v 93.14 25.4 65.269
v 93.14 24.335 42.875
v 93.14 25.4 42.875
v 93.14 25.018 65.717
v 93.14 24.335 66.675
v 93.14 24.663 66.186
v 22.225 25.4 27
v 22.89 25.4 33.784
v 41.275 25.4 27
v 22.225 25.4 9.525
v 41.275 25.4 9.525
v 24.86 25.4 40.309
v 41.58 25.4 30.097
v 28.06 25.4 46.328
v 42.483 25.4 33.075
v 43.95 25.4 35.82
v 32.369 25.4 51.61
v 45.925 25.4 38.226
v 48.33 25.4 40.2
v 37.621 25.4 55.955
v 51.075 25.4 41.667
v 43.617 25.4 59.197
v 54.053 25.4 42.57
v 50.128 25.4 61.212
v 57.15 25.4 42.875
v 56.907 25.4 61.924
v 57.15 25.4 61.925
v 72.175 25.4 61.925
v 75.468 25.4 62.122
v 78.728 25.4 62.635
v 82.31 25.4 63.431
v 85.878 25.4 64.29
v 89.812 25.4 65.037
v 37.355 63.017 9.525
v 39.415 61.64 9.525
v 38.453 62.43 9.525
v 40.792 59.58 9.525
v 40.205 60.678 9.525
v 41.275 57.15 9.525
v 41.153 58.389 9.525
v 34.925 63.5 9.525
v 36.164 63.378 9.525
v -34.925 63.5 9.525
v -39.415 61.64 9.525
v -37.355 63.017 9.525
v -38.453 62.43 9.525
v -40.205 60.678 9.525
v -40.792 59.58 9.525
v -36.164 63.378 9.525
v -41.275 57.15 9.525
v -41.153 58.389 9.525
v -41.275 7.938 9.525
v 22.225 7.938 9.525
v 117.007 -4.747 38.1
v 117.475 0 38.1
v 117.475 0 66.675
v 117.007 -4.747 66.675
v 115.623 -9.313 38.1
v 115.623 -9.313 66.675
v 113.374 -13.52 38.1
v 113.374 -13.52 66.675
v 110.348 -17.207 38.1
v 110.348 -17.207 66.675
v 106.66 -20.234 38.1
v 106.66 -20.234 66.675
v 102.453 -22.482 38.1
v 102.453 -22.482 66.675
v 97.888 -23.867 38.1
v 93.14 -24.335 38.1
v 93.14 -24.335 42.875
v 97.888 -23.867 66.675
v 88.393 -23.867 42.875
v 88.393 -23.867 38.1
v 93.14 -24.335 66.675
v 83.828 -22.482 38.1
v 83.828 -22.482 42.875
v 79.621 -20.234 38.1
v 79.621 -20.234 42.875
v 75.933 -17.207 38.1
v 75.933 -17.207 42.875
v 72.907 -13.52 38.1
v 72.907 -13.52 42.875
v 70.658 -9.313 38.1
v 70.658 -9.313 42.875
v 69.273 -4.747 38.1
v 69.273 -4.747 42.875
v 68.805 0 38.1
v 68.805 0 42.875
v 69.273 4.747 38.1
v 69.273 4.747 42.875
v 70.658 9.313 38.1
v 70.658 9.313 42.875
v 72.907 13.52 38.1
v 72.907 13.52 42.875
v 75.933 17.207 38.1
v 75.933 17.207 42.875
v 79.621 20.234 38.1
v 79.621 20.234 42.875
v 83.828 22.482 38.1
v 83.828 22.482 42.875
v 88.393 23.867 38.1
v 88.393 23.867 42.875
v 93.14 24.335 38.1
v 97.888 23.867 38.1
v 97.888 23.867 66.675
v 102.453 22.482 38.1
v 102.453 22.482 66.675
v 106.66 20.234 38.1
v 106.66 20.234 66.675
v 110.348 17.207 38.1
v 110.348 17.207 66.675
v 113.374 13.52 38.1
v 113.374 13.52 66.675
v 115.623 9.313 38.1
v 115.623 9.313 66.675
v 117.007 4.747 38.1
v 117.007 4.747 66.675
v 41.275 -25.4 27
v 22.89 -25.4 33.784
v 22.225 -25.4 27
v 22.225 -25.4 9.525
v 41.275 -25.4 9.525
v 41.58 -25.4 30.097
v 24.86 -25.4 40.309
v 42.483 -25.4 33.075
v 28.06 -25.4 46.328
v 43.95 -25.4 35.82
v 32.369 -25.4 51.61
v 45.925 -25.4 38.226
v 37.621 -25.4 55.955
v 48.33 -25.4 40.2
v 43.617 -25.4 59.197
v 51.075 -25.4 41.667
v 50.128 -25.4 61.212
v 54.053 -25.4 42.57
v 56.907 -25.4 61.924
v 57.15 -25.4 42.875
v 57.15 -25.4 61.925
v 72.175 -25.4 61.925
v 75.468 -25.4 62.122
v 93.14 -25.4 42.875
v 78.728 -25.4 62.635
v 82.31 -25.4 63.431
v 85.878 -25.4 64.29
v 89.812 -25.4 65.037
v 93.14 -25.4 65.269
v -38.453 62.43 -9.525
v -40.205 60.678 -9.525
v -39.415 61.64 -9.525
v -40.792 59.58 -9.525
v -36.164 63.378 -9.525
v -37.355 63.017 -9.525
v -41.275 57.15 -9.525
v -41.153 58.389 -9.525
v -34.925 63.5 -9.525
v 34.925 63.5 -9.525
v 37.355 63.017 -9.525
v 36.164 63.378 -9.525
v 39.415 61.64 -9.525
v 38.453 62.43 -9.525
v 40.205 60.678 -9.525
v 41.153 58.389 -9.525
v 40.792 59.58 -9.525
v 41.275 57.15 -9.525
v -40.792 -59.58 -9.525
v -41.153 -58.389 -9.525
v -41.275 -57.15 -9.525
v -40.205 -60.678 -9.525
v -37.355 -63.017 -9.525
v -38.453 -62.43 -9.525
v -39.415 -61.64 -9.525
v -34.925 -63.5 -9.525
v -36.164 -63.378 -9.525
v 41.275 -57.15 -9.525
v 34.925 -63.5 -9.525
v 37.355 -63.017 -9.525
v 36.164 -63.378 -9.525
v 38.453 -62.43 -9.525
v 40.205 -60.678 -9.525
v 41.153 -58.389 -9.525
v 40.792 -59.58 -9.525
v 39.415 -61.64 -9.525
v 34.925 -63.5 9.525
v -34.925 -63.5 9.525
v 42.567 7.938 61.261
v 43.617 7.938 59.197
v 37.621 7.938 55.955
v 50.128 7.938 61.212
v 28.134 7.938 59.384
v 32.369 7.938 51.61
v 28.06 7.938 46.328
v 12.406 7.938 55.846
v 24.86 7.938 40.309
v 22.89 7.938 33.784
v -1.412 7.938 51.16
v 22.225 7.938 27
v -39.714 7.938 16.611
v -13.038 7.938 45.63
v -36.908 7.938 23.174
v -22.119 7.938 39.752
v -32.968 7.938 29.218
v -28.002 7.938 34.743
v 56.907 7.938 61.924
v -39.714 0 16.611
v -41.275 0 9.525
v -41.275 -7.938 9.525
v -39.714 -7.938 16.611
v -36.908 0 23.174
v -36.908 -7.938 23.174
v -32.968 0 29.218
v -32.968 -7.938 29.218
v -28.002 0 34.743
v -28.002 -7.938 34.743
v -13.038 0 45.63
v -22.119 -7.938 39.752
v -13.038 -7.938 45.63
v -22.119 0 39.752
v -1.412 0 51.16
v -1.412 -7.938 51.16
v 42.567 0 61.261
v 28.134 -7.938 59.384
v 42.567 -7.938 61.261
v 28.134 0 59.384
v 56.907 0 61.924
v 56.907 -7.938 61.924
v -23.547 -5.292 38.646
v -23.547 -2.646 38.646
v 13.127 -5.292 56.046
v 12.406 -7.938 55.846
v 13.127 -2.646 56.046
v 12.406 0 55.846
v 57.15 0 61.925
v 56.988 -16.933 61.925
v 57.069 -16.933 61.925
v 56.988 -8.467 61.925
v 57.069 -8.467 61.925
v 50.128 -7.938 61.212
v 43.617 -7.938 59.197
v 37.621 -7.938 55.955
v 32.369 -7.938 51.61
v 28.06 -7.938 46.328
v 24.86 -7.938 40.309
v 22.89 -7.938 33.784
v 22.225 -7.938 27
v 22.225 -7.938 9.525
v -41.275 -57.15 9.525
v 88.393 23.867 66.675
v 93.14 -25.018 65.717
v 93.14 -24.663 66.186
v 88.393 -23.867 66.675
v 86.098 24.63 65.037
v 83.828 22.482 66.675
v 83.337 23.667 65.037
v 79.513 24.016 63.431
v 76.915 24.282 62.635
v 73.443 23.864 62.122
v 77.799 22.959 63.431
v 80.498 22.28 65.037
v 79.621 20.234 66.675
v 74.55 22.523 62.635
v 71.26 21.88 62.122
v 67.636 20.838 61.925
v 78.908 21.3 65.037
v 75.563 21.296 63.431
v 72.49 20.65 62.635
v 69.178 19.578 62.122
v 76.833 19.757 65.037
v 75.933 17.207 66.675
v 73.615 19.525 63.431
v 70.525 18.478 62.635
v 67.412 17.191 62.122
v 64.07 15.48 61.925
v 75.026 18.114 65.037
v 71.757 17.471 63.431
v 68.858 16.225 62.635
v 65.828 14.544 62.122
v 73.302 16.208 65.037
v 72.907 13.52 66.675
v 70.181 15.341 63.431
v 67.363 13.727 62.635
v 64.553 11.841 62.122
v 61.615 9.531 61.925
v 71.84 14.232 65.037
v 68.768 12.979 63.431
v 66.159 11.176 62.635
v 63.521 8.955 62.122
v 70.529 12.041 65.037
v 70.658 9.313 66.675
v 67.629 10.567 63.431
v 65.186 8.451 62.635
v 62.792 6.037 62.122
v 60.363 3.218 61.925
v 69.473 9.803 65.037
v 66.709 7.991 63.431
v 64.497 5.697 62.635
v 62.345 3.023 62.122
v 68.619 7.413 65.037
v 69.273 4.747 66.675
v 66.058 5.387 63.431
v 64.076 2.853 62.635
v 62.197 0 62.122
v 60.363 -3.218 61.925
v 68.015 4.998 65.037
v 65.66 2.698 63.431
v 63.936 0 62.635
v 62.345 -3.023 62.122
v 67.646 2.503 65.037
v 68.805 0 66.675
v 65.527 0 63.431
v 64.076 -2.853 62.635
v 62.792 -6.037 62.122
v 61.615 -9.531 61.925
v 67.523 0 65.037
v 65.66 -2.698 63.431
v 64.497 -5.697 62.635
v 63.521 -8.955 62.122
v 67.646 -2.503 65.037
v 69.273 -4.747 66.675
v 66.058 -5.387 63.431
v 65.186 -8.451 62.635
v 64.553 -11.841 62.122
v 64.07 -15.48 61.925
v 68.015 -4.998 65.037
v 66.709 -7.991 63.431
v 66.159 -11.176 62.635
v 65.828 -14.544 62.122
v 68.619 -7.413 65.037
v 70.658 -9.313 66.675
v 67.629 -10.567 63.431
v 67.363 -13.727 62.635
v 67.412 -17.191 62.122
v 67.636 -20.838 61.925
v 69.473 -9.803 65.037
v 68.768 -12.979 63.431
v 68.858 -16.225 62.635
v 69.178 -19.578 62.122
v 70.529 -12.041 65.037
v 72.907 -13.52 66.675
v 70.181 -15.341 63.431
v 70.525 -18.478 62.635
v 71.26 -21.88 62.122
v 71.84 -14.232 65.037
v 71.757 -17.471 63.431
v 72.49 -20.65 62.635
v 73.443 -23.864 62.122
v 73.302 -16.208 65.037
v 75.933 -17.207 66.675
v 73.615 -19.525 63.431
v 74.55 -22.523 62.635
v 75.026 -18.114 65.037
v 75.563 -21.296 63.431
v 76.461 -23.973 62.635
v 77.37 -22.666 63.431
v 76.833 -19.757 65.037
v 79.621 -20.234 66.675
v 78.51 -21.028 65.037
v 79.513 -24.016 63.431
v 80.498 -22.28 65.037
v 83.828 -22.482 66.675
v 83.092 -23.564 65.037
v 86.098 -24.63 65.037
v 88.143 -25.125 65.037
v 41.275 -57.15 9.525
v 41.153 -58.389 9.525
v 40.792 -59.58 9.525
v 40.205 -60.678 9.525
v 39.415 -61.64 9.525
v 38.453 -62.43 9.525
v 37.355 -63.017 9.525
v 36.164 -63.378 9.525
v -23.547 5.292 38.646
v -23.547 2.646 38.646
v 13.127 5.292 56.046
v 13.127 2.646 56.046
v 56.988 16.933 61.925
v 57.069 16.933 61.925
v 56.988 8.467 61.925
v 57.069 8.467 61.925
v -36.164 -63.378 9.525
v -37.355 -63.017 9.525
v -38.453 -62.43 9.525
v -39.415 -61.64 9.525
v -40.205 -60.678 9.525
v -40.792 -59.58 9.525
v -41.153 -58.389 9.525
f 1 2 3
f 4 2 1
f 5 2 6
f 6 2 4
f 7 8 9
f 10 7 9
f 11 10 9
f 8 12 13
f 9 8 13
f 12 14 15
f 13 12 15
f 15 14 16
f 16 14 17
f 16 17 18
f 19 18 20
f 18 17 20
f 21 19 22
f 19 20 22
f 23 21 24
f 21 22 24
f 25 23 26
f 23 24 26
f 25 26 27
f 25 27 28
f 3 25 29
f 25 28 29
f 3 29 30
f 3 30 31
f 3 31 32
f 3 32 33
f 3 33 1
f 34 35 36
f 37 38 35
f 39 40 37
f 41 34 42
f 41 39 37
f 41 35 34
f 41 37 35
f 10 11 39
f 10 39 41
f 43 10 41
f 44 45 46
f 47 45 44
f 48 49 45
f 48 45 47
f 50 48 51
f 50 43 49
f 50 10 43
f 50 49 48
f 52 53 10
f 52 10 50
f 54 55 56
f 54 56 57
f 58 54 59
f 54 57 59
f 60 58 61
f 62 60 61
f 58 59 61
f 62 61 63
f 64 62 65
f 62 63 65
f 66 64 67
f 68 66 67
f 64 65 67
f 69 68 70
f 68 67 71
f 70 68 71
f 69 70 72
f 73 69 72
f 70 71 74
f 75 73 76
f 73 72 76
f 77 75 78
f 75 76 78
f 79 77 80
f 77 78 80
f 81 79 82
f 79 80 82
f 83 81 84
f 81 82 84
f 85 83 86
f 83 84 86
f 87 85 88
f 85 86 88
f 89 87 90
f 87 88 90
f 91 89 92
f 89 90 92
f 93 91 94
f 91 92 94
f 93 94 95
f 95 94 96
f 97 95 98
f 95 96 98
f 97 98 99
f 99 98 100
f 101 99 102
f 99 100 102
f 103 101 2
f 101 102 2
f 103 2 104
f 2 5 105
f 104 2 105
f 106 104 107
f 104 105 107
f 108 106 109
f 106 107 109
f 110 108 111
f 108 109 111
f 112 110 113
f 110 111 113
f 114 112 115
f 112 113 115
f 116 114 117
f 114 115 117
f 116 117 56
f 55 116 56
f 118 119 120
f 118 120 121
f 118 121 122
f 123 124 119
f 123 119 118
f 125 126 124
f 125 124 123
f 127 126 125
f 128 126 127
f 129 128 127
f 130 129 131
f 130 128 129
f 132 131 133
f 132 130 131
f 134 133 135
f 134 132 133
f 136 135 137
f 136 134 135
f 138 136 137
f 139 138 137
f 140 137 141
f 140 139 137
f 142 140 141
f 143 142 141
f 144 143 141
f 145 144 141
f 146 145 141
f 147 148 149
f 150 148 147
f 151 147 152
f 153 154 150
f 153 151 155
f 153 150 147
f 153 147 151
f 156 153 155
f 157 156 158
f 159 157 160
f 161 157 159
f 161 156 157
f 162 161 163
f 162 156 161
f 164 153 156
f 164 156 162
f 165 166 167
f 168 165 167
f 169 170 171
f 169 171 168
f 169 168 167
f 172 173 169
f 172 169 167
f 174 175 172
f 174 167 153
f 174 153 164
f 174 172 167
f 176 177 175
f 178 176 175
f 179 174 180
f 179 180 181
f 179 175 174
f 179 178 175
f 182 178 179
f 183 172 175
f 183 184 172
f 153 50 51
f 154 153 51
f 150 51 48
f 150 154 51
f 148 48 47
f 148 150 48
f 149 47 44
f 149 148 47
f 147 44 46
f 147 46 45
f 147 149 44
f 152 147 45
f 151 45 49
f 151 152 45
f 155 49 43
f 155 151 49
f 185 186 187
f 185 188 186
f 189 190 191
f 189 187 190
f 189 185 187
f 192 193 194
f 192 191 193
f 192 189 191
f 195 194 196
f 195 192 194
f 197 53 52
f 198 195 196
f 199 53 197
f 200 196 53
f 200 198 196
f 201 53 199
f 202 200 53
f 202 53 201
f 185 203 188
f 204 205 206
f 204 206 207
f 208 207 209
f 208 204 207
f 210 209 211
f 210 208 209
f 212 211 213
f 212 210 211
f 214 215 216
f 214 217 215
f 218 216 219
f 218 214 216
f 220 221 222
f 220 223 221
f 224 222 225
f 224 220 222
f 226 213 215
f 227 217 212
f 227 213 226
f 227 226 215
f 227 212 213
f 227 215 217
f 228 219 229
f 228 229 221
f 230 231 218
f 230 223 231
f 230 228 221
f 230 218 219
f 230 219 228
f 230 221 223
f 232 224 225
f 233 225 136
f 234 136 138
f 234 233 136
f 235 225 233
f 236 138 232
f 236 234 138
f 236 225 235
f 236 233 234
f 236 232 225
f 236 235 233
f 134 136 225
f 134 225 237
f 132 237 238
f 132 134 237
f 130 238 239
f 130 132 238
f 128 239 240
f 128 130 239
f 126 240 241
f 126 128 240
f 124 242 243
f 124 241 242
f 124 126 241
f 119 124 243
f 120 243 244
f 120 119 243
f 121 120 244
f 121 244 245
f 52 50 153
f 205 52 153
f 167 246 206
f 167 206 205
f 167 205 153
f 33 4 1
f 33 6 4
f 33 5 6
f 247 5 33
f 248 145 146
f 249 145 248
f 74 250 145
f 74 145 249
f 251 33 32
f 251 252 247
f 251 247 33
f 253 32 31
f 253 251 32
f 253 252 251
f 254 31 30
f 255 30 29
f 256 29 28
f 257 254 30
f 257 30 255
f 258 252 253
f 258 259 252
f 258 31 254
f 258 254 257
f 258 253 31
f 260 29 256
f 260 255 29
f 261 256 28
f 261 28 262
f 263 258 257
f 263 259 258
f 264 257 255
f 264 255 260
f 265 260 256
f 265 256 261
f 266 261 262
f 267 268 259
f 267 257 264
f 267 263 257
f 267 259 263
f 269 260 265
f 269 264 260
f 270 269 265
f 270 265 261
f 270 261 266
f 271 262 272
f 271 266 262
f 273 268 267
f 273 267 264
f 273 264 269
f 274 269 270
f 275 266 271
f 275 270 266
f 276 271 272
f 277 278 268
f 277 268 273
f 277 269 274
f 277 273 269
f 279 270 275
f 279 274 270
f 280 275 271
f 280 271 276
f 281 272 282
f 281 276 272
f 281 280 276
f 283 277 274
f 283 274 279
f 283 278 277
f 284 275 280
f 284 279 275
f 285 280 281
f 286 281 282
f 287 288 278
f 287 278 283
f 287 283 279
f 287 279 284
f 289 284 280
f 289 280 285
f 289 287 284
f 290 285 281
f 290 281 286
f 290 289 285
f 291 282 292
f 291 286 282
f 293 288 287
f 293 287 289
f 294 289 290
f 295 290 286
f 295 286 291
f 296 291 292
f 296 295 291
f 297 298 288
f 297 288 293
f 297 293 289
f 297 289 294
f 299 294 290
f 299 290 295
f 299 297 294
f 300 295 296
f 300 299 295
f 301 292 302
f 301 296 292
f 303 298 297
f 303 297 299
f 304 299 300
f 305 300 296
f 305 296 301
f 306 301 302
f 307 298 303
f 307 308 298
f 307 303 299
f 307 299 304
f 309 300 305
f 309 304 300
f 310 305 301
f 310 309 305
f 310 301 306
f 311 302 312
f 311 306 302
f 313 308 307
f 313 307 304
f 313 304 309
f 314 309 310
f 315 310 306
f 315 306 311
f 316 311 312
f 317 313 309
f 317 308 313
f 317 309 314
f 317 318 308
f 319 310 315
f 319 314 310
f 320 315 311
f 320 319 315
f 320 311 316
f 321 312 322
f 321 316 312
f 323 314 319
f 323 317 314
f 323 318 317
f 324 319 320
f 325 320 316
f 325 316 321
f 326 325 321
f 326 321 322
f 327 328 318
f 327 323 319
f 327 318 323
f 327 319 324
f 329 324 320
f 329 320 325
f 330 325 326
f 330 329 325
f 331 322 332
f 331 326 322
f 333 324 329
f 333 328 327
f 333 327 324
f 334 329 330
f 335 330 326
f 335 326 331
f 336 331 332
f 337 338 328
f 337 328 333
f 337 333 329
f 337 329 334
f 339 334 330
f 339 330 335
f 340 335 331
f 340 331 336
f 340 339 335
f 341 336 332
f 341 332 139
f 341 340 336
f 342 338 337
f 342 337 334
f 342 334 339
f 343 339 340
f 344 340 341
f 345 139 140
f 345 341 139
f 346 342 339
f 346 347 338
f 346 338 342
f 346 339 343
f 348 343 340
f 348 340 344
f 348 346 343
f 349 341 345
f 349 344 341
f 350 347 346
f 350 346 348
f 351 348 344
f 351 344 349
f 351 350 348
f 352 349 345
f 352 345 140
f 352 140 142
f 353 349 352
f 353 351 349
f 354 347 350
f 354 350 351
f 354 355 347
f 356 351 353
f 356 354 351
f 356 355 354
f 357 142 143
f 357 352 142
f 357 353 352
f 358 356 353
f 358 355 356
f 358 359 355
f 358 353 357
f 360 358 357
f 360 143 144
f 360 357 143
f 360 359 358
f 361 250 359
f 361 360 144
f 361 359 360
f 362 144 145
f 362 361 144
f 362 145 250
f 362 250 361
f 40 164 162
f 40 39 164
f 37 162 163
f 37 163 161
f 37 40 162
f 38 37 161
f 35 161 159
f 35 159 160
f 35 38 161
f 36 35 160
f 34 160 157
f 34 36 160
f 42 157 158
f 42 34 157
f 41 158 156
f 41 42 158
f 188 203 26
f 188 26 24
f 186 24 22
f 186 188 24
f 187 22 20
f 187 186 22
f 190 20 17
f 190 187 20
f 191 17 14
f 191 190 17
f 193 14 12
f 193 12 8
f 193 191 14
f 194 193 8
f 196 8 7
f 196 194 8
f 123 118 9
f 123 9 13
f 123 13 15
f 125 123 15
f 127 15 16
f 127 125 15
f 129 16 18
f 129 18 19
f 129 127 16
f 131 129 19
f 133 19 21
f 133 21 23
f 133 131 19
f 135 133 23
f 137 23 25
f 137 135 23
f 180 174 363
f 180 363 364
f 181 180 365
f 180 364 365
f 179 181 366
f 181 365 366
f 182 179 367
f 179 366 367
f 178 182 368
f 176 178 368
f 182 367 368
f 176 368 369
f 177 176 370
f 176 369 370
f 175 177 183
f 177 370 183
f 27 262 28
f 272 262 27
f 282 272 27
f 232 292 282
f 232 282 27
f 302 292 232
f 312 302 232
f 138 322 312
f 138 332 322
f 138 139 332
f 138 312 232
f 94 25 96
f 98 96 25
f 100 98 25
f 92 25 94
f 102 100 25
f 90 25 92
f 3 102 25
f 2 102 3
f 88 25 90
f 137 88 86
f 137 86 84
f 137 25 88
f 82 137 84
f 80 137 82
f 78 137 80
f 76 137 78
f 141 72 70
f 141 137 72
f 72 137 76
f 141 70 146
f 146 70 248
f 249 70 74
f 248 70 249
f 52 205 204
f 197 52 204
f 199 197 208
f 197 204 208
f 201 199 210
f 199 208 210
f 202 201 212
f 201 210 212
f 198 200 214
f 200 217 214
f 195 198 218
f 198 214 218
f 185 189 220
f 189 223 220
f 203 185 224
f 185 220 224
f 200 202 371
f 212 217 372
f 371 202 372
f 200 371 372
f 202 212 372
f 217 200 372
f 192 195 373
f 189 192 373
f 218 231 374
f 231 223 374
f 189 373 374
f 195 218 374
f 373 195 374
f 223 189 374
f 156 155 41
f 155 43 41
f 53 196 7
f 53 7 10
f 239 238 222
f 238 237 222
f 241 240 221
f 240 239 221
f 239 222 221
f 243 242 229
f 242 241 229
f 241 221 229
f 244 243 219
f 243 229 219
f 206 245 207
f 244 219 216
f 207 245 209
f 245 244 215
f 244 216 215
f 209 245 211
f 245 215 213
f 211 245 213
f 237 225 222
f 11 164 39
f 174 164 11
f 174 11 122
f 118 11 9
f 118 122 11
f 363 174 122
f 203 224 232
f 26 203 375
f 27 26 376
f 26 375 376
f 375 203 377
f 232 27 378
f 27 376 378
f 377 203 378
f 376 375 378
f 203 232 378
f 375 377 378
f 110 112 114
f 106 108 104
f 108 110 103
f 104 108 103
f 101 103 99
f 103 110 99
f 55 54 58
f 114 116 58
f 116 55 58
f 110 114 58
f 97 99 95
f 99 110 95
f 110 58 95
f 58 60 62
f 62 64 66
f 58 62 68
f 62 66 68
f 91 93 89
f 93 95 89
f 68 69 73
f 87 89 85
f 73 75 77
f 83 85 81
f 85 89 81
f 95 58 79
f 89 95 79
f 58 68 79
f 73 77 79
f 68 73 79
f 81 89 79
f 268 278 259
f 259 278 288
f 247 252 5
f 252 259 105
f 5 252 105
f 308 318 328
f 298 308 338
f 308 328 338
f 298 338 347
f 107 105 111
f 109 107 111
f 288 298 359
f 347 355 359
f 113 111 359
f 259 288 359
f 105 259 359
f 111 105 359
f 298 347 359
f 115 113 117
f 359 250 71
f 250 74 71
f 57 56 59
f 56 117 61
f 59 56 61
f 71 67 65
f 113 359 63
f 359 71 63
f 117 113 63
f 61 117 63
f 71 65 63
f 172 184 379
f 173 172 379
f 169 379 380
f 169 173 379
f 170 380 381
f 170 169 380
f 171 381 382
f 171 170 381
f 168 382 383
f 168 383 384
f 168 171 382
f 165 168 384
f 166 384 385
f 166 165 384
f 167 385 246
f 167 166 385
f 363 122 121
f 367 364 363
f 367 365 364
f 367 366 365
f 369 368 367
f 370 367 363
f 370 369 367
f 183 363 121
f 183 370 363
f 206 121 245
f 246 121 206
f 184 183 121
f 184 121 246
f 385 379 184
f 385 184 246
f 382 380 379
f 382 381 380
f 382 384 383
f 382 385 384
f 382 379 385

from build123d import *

# Parameters (mm, degrees)
F1_DEPTH    = 63.5
F0_W        = 26.465196414
F0_H        = 19.05
F2_DEPTH    = 25.4
F3_DEPTH    = 7.9375
F5_R        = 6.35
F6_T4_ANGLE = 180


# Not quite as in the source:
# - a fillet or chamfer that OpenCascade refuses, or shapes differently, is made with other operations: its cross-section is extruded or revolved along the edge and cut away or added


with BuildPart() as f1:
    # F0 (on Front) → F1 (new body, symmetric)
    with BuildSketch(Plane.XZ):
        Polygon((-41.275, -9.525), (41.275, -9.525), (41.275, 9.525), (22.225, 9.525), (-41.275, 9.525), align=None)
    extrude(amount=F1_DEPTH, both=True)

    # F0 (on Front) → F2 (join, symmetric)
    with BuildSketch(Plane.XZ):
        with BuildLine():
            Line((22.225, 9.525), (41.275, 9.525))
            Line((41.275, 9.525), (41.275, 27.0002))
            ThreePointArc((41.275, 27.0002), (45.9246798487, 38.2255201513), (57.15, 42.8752))
            Line((57.15, 42.8752), (66.675, 42.8752))
            Line((66.675, 42.8752), (66.675, 61.9252))
            Line((66.675, 61.9252), (57.15, 61.9252))
            add(Edge.make_bspline(
                [(56.9072220114, 61.9243561652), (56.9881728551, 61.9246965832), (57.0690989666, 61.9249778596), (57.15, 61.9252)],
                knots=[111.2968717992, 111.2968717992, 111.2968717992, 111.2968717992, 111.5045361635, 111.5045361635, 111.5045361635, 111.5045361635], degree=3))
            ThreePointArc((56.9072220114, 61.9243561652), (32.3686093383, 51.6099196626), (22.225, 27.0002))
            Line((22.225, 27.0002), (22.225, 9.525))
        make_face()
        with Locations((79.907598207, 52.4002)):
            Rectangle(F0_W, F0_H)
    extrude(amount=F2_DEPTH, both=True)

    # F0 (on Front) → F3 (join, symmetric)
    with BuildSketch(Plane.XZ):
        with BuildLine():
            add(Edge.make_bspline(
                [(-41.275, 9.525), (-36.9673291938, 44.5717190185), (13.5219464317, 61.7419104925), (56.9072220114, 61.9243561652)],
                knots=[0, 0, 0, 0, 111.2968717992, 111.2968717992, 111.2968717992, 111.2968717992], degree=3))
            Line((-41.275, 9.525), (22.225, 9.525))
            Line((22.225, 9.525), (22.225, 27.0002))
            ThreePointArc((22.225, 27.0002), (32.3686093383, 51.6099196626), (56.9072220114, 61.9243561652))
        make_face()
    extrude(amount=F3_DEPTH, both=True)

    # F0 (on Front) → F4 (revolve)
    with BuildSketch(Plane.XZ):
        Polygon((93.140196414, 61.9252), (93.140196414, 42.8752), (93.140196414, 38.1), (117.475, 38.1), (117.475, 66.675), (93.140196414, 66.675), align=None)
    revolve(axis=Axis((93.140196414, 0, 52.3875), (0, 0, -1)))

    # F5
    f5_edges = [f1.edges().sort_by_distance(p)[0] for p in [
        (-41.275, 63.5, 0),
        (-41.275, -63.5, 0),
        (41.275, -63.5, 0),
        (41.275, 63.5, 0),
    ]]
    fillet(f5_edges, radius=F5_R)

    # F6: fillet of radius 10.16 on 1 edges, made by hand


with BuildPart() as f6_tool2:
    # F6_s3 → F6_t4 (revolve)
    with BuildSketch(Plane.YZ.offset(93.140196414)):
        with BuildLine():
            ThreePointArc((32.9345324166, 61.9252), (28.0224061967, 63.1915721688), (24.334803586, 66.675))
            Line((24.334803586, 66.675), (24.334803586, 61.9252))
            Line((24.334803586, 61.9252), (32.9345324166, 61.9252))
        make_face()
    revolve(axis=Axis((93.140196414, 0, 61.9252), (0, 0, 1)), revolution_arc=F6_T4_ANGLE)

    split(bisect_by=Plane.XZ.offset(-25.4), keep=Keep.TOP)

    split(bisect_by=Plane.XZ.offset(25.4), keep=Keep.BOTTOM)


with BuildPart() as f1_1:
    add(f1.part)

    # F6_t1: union F6_tool2
    add(f6_tool2.part)


solid = f1_1.part
